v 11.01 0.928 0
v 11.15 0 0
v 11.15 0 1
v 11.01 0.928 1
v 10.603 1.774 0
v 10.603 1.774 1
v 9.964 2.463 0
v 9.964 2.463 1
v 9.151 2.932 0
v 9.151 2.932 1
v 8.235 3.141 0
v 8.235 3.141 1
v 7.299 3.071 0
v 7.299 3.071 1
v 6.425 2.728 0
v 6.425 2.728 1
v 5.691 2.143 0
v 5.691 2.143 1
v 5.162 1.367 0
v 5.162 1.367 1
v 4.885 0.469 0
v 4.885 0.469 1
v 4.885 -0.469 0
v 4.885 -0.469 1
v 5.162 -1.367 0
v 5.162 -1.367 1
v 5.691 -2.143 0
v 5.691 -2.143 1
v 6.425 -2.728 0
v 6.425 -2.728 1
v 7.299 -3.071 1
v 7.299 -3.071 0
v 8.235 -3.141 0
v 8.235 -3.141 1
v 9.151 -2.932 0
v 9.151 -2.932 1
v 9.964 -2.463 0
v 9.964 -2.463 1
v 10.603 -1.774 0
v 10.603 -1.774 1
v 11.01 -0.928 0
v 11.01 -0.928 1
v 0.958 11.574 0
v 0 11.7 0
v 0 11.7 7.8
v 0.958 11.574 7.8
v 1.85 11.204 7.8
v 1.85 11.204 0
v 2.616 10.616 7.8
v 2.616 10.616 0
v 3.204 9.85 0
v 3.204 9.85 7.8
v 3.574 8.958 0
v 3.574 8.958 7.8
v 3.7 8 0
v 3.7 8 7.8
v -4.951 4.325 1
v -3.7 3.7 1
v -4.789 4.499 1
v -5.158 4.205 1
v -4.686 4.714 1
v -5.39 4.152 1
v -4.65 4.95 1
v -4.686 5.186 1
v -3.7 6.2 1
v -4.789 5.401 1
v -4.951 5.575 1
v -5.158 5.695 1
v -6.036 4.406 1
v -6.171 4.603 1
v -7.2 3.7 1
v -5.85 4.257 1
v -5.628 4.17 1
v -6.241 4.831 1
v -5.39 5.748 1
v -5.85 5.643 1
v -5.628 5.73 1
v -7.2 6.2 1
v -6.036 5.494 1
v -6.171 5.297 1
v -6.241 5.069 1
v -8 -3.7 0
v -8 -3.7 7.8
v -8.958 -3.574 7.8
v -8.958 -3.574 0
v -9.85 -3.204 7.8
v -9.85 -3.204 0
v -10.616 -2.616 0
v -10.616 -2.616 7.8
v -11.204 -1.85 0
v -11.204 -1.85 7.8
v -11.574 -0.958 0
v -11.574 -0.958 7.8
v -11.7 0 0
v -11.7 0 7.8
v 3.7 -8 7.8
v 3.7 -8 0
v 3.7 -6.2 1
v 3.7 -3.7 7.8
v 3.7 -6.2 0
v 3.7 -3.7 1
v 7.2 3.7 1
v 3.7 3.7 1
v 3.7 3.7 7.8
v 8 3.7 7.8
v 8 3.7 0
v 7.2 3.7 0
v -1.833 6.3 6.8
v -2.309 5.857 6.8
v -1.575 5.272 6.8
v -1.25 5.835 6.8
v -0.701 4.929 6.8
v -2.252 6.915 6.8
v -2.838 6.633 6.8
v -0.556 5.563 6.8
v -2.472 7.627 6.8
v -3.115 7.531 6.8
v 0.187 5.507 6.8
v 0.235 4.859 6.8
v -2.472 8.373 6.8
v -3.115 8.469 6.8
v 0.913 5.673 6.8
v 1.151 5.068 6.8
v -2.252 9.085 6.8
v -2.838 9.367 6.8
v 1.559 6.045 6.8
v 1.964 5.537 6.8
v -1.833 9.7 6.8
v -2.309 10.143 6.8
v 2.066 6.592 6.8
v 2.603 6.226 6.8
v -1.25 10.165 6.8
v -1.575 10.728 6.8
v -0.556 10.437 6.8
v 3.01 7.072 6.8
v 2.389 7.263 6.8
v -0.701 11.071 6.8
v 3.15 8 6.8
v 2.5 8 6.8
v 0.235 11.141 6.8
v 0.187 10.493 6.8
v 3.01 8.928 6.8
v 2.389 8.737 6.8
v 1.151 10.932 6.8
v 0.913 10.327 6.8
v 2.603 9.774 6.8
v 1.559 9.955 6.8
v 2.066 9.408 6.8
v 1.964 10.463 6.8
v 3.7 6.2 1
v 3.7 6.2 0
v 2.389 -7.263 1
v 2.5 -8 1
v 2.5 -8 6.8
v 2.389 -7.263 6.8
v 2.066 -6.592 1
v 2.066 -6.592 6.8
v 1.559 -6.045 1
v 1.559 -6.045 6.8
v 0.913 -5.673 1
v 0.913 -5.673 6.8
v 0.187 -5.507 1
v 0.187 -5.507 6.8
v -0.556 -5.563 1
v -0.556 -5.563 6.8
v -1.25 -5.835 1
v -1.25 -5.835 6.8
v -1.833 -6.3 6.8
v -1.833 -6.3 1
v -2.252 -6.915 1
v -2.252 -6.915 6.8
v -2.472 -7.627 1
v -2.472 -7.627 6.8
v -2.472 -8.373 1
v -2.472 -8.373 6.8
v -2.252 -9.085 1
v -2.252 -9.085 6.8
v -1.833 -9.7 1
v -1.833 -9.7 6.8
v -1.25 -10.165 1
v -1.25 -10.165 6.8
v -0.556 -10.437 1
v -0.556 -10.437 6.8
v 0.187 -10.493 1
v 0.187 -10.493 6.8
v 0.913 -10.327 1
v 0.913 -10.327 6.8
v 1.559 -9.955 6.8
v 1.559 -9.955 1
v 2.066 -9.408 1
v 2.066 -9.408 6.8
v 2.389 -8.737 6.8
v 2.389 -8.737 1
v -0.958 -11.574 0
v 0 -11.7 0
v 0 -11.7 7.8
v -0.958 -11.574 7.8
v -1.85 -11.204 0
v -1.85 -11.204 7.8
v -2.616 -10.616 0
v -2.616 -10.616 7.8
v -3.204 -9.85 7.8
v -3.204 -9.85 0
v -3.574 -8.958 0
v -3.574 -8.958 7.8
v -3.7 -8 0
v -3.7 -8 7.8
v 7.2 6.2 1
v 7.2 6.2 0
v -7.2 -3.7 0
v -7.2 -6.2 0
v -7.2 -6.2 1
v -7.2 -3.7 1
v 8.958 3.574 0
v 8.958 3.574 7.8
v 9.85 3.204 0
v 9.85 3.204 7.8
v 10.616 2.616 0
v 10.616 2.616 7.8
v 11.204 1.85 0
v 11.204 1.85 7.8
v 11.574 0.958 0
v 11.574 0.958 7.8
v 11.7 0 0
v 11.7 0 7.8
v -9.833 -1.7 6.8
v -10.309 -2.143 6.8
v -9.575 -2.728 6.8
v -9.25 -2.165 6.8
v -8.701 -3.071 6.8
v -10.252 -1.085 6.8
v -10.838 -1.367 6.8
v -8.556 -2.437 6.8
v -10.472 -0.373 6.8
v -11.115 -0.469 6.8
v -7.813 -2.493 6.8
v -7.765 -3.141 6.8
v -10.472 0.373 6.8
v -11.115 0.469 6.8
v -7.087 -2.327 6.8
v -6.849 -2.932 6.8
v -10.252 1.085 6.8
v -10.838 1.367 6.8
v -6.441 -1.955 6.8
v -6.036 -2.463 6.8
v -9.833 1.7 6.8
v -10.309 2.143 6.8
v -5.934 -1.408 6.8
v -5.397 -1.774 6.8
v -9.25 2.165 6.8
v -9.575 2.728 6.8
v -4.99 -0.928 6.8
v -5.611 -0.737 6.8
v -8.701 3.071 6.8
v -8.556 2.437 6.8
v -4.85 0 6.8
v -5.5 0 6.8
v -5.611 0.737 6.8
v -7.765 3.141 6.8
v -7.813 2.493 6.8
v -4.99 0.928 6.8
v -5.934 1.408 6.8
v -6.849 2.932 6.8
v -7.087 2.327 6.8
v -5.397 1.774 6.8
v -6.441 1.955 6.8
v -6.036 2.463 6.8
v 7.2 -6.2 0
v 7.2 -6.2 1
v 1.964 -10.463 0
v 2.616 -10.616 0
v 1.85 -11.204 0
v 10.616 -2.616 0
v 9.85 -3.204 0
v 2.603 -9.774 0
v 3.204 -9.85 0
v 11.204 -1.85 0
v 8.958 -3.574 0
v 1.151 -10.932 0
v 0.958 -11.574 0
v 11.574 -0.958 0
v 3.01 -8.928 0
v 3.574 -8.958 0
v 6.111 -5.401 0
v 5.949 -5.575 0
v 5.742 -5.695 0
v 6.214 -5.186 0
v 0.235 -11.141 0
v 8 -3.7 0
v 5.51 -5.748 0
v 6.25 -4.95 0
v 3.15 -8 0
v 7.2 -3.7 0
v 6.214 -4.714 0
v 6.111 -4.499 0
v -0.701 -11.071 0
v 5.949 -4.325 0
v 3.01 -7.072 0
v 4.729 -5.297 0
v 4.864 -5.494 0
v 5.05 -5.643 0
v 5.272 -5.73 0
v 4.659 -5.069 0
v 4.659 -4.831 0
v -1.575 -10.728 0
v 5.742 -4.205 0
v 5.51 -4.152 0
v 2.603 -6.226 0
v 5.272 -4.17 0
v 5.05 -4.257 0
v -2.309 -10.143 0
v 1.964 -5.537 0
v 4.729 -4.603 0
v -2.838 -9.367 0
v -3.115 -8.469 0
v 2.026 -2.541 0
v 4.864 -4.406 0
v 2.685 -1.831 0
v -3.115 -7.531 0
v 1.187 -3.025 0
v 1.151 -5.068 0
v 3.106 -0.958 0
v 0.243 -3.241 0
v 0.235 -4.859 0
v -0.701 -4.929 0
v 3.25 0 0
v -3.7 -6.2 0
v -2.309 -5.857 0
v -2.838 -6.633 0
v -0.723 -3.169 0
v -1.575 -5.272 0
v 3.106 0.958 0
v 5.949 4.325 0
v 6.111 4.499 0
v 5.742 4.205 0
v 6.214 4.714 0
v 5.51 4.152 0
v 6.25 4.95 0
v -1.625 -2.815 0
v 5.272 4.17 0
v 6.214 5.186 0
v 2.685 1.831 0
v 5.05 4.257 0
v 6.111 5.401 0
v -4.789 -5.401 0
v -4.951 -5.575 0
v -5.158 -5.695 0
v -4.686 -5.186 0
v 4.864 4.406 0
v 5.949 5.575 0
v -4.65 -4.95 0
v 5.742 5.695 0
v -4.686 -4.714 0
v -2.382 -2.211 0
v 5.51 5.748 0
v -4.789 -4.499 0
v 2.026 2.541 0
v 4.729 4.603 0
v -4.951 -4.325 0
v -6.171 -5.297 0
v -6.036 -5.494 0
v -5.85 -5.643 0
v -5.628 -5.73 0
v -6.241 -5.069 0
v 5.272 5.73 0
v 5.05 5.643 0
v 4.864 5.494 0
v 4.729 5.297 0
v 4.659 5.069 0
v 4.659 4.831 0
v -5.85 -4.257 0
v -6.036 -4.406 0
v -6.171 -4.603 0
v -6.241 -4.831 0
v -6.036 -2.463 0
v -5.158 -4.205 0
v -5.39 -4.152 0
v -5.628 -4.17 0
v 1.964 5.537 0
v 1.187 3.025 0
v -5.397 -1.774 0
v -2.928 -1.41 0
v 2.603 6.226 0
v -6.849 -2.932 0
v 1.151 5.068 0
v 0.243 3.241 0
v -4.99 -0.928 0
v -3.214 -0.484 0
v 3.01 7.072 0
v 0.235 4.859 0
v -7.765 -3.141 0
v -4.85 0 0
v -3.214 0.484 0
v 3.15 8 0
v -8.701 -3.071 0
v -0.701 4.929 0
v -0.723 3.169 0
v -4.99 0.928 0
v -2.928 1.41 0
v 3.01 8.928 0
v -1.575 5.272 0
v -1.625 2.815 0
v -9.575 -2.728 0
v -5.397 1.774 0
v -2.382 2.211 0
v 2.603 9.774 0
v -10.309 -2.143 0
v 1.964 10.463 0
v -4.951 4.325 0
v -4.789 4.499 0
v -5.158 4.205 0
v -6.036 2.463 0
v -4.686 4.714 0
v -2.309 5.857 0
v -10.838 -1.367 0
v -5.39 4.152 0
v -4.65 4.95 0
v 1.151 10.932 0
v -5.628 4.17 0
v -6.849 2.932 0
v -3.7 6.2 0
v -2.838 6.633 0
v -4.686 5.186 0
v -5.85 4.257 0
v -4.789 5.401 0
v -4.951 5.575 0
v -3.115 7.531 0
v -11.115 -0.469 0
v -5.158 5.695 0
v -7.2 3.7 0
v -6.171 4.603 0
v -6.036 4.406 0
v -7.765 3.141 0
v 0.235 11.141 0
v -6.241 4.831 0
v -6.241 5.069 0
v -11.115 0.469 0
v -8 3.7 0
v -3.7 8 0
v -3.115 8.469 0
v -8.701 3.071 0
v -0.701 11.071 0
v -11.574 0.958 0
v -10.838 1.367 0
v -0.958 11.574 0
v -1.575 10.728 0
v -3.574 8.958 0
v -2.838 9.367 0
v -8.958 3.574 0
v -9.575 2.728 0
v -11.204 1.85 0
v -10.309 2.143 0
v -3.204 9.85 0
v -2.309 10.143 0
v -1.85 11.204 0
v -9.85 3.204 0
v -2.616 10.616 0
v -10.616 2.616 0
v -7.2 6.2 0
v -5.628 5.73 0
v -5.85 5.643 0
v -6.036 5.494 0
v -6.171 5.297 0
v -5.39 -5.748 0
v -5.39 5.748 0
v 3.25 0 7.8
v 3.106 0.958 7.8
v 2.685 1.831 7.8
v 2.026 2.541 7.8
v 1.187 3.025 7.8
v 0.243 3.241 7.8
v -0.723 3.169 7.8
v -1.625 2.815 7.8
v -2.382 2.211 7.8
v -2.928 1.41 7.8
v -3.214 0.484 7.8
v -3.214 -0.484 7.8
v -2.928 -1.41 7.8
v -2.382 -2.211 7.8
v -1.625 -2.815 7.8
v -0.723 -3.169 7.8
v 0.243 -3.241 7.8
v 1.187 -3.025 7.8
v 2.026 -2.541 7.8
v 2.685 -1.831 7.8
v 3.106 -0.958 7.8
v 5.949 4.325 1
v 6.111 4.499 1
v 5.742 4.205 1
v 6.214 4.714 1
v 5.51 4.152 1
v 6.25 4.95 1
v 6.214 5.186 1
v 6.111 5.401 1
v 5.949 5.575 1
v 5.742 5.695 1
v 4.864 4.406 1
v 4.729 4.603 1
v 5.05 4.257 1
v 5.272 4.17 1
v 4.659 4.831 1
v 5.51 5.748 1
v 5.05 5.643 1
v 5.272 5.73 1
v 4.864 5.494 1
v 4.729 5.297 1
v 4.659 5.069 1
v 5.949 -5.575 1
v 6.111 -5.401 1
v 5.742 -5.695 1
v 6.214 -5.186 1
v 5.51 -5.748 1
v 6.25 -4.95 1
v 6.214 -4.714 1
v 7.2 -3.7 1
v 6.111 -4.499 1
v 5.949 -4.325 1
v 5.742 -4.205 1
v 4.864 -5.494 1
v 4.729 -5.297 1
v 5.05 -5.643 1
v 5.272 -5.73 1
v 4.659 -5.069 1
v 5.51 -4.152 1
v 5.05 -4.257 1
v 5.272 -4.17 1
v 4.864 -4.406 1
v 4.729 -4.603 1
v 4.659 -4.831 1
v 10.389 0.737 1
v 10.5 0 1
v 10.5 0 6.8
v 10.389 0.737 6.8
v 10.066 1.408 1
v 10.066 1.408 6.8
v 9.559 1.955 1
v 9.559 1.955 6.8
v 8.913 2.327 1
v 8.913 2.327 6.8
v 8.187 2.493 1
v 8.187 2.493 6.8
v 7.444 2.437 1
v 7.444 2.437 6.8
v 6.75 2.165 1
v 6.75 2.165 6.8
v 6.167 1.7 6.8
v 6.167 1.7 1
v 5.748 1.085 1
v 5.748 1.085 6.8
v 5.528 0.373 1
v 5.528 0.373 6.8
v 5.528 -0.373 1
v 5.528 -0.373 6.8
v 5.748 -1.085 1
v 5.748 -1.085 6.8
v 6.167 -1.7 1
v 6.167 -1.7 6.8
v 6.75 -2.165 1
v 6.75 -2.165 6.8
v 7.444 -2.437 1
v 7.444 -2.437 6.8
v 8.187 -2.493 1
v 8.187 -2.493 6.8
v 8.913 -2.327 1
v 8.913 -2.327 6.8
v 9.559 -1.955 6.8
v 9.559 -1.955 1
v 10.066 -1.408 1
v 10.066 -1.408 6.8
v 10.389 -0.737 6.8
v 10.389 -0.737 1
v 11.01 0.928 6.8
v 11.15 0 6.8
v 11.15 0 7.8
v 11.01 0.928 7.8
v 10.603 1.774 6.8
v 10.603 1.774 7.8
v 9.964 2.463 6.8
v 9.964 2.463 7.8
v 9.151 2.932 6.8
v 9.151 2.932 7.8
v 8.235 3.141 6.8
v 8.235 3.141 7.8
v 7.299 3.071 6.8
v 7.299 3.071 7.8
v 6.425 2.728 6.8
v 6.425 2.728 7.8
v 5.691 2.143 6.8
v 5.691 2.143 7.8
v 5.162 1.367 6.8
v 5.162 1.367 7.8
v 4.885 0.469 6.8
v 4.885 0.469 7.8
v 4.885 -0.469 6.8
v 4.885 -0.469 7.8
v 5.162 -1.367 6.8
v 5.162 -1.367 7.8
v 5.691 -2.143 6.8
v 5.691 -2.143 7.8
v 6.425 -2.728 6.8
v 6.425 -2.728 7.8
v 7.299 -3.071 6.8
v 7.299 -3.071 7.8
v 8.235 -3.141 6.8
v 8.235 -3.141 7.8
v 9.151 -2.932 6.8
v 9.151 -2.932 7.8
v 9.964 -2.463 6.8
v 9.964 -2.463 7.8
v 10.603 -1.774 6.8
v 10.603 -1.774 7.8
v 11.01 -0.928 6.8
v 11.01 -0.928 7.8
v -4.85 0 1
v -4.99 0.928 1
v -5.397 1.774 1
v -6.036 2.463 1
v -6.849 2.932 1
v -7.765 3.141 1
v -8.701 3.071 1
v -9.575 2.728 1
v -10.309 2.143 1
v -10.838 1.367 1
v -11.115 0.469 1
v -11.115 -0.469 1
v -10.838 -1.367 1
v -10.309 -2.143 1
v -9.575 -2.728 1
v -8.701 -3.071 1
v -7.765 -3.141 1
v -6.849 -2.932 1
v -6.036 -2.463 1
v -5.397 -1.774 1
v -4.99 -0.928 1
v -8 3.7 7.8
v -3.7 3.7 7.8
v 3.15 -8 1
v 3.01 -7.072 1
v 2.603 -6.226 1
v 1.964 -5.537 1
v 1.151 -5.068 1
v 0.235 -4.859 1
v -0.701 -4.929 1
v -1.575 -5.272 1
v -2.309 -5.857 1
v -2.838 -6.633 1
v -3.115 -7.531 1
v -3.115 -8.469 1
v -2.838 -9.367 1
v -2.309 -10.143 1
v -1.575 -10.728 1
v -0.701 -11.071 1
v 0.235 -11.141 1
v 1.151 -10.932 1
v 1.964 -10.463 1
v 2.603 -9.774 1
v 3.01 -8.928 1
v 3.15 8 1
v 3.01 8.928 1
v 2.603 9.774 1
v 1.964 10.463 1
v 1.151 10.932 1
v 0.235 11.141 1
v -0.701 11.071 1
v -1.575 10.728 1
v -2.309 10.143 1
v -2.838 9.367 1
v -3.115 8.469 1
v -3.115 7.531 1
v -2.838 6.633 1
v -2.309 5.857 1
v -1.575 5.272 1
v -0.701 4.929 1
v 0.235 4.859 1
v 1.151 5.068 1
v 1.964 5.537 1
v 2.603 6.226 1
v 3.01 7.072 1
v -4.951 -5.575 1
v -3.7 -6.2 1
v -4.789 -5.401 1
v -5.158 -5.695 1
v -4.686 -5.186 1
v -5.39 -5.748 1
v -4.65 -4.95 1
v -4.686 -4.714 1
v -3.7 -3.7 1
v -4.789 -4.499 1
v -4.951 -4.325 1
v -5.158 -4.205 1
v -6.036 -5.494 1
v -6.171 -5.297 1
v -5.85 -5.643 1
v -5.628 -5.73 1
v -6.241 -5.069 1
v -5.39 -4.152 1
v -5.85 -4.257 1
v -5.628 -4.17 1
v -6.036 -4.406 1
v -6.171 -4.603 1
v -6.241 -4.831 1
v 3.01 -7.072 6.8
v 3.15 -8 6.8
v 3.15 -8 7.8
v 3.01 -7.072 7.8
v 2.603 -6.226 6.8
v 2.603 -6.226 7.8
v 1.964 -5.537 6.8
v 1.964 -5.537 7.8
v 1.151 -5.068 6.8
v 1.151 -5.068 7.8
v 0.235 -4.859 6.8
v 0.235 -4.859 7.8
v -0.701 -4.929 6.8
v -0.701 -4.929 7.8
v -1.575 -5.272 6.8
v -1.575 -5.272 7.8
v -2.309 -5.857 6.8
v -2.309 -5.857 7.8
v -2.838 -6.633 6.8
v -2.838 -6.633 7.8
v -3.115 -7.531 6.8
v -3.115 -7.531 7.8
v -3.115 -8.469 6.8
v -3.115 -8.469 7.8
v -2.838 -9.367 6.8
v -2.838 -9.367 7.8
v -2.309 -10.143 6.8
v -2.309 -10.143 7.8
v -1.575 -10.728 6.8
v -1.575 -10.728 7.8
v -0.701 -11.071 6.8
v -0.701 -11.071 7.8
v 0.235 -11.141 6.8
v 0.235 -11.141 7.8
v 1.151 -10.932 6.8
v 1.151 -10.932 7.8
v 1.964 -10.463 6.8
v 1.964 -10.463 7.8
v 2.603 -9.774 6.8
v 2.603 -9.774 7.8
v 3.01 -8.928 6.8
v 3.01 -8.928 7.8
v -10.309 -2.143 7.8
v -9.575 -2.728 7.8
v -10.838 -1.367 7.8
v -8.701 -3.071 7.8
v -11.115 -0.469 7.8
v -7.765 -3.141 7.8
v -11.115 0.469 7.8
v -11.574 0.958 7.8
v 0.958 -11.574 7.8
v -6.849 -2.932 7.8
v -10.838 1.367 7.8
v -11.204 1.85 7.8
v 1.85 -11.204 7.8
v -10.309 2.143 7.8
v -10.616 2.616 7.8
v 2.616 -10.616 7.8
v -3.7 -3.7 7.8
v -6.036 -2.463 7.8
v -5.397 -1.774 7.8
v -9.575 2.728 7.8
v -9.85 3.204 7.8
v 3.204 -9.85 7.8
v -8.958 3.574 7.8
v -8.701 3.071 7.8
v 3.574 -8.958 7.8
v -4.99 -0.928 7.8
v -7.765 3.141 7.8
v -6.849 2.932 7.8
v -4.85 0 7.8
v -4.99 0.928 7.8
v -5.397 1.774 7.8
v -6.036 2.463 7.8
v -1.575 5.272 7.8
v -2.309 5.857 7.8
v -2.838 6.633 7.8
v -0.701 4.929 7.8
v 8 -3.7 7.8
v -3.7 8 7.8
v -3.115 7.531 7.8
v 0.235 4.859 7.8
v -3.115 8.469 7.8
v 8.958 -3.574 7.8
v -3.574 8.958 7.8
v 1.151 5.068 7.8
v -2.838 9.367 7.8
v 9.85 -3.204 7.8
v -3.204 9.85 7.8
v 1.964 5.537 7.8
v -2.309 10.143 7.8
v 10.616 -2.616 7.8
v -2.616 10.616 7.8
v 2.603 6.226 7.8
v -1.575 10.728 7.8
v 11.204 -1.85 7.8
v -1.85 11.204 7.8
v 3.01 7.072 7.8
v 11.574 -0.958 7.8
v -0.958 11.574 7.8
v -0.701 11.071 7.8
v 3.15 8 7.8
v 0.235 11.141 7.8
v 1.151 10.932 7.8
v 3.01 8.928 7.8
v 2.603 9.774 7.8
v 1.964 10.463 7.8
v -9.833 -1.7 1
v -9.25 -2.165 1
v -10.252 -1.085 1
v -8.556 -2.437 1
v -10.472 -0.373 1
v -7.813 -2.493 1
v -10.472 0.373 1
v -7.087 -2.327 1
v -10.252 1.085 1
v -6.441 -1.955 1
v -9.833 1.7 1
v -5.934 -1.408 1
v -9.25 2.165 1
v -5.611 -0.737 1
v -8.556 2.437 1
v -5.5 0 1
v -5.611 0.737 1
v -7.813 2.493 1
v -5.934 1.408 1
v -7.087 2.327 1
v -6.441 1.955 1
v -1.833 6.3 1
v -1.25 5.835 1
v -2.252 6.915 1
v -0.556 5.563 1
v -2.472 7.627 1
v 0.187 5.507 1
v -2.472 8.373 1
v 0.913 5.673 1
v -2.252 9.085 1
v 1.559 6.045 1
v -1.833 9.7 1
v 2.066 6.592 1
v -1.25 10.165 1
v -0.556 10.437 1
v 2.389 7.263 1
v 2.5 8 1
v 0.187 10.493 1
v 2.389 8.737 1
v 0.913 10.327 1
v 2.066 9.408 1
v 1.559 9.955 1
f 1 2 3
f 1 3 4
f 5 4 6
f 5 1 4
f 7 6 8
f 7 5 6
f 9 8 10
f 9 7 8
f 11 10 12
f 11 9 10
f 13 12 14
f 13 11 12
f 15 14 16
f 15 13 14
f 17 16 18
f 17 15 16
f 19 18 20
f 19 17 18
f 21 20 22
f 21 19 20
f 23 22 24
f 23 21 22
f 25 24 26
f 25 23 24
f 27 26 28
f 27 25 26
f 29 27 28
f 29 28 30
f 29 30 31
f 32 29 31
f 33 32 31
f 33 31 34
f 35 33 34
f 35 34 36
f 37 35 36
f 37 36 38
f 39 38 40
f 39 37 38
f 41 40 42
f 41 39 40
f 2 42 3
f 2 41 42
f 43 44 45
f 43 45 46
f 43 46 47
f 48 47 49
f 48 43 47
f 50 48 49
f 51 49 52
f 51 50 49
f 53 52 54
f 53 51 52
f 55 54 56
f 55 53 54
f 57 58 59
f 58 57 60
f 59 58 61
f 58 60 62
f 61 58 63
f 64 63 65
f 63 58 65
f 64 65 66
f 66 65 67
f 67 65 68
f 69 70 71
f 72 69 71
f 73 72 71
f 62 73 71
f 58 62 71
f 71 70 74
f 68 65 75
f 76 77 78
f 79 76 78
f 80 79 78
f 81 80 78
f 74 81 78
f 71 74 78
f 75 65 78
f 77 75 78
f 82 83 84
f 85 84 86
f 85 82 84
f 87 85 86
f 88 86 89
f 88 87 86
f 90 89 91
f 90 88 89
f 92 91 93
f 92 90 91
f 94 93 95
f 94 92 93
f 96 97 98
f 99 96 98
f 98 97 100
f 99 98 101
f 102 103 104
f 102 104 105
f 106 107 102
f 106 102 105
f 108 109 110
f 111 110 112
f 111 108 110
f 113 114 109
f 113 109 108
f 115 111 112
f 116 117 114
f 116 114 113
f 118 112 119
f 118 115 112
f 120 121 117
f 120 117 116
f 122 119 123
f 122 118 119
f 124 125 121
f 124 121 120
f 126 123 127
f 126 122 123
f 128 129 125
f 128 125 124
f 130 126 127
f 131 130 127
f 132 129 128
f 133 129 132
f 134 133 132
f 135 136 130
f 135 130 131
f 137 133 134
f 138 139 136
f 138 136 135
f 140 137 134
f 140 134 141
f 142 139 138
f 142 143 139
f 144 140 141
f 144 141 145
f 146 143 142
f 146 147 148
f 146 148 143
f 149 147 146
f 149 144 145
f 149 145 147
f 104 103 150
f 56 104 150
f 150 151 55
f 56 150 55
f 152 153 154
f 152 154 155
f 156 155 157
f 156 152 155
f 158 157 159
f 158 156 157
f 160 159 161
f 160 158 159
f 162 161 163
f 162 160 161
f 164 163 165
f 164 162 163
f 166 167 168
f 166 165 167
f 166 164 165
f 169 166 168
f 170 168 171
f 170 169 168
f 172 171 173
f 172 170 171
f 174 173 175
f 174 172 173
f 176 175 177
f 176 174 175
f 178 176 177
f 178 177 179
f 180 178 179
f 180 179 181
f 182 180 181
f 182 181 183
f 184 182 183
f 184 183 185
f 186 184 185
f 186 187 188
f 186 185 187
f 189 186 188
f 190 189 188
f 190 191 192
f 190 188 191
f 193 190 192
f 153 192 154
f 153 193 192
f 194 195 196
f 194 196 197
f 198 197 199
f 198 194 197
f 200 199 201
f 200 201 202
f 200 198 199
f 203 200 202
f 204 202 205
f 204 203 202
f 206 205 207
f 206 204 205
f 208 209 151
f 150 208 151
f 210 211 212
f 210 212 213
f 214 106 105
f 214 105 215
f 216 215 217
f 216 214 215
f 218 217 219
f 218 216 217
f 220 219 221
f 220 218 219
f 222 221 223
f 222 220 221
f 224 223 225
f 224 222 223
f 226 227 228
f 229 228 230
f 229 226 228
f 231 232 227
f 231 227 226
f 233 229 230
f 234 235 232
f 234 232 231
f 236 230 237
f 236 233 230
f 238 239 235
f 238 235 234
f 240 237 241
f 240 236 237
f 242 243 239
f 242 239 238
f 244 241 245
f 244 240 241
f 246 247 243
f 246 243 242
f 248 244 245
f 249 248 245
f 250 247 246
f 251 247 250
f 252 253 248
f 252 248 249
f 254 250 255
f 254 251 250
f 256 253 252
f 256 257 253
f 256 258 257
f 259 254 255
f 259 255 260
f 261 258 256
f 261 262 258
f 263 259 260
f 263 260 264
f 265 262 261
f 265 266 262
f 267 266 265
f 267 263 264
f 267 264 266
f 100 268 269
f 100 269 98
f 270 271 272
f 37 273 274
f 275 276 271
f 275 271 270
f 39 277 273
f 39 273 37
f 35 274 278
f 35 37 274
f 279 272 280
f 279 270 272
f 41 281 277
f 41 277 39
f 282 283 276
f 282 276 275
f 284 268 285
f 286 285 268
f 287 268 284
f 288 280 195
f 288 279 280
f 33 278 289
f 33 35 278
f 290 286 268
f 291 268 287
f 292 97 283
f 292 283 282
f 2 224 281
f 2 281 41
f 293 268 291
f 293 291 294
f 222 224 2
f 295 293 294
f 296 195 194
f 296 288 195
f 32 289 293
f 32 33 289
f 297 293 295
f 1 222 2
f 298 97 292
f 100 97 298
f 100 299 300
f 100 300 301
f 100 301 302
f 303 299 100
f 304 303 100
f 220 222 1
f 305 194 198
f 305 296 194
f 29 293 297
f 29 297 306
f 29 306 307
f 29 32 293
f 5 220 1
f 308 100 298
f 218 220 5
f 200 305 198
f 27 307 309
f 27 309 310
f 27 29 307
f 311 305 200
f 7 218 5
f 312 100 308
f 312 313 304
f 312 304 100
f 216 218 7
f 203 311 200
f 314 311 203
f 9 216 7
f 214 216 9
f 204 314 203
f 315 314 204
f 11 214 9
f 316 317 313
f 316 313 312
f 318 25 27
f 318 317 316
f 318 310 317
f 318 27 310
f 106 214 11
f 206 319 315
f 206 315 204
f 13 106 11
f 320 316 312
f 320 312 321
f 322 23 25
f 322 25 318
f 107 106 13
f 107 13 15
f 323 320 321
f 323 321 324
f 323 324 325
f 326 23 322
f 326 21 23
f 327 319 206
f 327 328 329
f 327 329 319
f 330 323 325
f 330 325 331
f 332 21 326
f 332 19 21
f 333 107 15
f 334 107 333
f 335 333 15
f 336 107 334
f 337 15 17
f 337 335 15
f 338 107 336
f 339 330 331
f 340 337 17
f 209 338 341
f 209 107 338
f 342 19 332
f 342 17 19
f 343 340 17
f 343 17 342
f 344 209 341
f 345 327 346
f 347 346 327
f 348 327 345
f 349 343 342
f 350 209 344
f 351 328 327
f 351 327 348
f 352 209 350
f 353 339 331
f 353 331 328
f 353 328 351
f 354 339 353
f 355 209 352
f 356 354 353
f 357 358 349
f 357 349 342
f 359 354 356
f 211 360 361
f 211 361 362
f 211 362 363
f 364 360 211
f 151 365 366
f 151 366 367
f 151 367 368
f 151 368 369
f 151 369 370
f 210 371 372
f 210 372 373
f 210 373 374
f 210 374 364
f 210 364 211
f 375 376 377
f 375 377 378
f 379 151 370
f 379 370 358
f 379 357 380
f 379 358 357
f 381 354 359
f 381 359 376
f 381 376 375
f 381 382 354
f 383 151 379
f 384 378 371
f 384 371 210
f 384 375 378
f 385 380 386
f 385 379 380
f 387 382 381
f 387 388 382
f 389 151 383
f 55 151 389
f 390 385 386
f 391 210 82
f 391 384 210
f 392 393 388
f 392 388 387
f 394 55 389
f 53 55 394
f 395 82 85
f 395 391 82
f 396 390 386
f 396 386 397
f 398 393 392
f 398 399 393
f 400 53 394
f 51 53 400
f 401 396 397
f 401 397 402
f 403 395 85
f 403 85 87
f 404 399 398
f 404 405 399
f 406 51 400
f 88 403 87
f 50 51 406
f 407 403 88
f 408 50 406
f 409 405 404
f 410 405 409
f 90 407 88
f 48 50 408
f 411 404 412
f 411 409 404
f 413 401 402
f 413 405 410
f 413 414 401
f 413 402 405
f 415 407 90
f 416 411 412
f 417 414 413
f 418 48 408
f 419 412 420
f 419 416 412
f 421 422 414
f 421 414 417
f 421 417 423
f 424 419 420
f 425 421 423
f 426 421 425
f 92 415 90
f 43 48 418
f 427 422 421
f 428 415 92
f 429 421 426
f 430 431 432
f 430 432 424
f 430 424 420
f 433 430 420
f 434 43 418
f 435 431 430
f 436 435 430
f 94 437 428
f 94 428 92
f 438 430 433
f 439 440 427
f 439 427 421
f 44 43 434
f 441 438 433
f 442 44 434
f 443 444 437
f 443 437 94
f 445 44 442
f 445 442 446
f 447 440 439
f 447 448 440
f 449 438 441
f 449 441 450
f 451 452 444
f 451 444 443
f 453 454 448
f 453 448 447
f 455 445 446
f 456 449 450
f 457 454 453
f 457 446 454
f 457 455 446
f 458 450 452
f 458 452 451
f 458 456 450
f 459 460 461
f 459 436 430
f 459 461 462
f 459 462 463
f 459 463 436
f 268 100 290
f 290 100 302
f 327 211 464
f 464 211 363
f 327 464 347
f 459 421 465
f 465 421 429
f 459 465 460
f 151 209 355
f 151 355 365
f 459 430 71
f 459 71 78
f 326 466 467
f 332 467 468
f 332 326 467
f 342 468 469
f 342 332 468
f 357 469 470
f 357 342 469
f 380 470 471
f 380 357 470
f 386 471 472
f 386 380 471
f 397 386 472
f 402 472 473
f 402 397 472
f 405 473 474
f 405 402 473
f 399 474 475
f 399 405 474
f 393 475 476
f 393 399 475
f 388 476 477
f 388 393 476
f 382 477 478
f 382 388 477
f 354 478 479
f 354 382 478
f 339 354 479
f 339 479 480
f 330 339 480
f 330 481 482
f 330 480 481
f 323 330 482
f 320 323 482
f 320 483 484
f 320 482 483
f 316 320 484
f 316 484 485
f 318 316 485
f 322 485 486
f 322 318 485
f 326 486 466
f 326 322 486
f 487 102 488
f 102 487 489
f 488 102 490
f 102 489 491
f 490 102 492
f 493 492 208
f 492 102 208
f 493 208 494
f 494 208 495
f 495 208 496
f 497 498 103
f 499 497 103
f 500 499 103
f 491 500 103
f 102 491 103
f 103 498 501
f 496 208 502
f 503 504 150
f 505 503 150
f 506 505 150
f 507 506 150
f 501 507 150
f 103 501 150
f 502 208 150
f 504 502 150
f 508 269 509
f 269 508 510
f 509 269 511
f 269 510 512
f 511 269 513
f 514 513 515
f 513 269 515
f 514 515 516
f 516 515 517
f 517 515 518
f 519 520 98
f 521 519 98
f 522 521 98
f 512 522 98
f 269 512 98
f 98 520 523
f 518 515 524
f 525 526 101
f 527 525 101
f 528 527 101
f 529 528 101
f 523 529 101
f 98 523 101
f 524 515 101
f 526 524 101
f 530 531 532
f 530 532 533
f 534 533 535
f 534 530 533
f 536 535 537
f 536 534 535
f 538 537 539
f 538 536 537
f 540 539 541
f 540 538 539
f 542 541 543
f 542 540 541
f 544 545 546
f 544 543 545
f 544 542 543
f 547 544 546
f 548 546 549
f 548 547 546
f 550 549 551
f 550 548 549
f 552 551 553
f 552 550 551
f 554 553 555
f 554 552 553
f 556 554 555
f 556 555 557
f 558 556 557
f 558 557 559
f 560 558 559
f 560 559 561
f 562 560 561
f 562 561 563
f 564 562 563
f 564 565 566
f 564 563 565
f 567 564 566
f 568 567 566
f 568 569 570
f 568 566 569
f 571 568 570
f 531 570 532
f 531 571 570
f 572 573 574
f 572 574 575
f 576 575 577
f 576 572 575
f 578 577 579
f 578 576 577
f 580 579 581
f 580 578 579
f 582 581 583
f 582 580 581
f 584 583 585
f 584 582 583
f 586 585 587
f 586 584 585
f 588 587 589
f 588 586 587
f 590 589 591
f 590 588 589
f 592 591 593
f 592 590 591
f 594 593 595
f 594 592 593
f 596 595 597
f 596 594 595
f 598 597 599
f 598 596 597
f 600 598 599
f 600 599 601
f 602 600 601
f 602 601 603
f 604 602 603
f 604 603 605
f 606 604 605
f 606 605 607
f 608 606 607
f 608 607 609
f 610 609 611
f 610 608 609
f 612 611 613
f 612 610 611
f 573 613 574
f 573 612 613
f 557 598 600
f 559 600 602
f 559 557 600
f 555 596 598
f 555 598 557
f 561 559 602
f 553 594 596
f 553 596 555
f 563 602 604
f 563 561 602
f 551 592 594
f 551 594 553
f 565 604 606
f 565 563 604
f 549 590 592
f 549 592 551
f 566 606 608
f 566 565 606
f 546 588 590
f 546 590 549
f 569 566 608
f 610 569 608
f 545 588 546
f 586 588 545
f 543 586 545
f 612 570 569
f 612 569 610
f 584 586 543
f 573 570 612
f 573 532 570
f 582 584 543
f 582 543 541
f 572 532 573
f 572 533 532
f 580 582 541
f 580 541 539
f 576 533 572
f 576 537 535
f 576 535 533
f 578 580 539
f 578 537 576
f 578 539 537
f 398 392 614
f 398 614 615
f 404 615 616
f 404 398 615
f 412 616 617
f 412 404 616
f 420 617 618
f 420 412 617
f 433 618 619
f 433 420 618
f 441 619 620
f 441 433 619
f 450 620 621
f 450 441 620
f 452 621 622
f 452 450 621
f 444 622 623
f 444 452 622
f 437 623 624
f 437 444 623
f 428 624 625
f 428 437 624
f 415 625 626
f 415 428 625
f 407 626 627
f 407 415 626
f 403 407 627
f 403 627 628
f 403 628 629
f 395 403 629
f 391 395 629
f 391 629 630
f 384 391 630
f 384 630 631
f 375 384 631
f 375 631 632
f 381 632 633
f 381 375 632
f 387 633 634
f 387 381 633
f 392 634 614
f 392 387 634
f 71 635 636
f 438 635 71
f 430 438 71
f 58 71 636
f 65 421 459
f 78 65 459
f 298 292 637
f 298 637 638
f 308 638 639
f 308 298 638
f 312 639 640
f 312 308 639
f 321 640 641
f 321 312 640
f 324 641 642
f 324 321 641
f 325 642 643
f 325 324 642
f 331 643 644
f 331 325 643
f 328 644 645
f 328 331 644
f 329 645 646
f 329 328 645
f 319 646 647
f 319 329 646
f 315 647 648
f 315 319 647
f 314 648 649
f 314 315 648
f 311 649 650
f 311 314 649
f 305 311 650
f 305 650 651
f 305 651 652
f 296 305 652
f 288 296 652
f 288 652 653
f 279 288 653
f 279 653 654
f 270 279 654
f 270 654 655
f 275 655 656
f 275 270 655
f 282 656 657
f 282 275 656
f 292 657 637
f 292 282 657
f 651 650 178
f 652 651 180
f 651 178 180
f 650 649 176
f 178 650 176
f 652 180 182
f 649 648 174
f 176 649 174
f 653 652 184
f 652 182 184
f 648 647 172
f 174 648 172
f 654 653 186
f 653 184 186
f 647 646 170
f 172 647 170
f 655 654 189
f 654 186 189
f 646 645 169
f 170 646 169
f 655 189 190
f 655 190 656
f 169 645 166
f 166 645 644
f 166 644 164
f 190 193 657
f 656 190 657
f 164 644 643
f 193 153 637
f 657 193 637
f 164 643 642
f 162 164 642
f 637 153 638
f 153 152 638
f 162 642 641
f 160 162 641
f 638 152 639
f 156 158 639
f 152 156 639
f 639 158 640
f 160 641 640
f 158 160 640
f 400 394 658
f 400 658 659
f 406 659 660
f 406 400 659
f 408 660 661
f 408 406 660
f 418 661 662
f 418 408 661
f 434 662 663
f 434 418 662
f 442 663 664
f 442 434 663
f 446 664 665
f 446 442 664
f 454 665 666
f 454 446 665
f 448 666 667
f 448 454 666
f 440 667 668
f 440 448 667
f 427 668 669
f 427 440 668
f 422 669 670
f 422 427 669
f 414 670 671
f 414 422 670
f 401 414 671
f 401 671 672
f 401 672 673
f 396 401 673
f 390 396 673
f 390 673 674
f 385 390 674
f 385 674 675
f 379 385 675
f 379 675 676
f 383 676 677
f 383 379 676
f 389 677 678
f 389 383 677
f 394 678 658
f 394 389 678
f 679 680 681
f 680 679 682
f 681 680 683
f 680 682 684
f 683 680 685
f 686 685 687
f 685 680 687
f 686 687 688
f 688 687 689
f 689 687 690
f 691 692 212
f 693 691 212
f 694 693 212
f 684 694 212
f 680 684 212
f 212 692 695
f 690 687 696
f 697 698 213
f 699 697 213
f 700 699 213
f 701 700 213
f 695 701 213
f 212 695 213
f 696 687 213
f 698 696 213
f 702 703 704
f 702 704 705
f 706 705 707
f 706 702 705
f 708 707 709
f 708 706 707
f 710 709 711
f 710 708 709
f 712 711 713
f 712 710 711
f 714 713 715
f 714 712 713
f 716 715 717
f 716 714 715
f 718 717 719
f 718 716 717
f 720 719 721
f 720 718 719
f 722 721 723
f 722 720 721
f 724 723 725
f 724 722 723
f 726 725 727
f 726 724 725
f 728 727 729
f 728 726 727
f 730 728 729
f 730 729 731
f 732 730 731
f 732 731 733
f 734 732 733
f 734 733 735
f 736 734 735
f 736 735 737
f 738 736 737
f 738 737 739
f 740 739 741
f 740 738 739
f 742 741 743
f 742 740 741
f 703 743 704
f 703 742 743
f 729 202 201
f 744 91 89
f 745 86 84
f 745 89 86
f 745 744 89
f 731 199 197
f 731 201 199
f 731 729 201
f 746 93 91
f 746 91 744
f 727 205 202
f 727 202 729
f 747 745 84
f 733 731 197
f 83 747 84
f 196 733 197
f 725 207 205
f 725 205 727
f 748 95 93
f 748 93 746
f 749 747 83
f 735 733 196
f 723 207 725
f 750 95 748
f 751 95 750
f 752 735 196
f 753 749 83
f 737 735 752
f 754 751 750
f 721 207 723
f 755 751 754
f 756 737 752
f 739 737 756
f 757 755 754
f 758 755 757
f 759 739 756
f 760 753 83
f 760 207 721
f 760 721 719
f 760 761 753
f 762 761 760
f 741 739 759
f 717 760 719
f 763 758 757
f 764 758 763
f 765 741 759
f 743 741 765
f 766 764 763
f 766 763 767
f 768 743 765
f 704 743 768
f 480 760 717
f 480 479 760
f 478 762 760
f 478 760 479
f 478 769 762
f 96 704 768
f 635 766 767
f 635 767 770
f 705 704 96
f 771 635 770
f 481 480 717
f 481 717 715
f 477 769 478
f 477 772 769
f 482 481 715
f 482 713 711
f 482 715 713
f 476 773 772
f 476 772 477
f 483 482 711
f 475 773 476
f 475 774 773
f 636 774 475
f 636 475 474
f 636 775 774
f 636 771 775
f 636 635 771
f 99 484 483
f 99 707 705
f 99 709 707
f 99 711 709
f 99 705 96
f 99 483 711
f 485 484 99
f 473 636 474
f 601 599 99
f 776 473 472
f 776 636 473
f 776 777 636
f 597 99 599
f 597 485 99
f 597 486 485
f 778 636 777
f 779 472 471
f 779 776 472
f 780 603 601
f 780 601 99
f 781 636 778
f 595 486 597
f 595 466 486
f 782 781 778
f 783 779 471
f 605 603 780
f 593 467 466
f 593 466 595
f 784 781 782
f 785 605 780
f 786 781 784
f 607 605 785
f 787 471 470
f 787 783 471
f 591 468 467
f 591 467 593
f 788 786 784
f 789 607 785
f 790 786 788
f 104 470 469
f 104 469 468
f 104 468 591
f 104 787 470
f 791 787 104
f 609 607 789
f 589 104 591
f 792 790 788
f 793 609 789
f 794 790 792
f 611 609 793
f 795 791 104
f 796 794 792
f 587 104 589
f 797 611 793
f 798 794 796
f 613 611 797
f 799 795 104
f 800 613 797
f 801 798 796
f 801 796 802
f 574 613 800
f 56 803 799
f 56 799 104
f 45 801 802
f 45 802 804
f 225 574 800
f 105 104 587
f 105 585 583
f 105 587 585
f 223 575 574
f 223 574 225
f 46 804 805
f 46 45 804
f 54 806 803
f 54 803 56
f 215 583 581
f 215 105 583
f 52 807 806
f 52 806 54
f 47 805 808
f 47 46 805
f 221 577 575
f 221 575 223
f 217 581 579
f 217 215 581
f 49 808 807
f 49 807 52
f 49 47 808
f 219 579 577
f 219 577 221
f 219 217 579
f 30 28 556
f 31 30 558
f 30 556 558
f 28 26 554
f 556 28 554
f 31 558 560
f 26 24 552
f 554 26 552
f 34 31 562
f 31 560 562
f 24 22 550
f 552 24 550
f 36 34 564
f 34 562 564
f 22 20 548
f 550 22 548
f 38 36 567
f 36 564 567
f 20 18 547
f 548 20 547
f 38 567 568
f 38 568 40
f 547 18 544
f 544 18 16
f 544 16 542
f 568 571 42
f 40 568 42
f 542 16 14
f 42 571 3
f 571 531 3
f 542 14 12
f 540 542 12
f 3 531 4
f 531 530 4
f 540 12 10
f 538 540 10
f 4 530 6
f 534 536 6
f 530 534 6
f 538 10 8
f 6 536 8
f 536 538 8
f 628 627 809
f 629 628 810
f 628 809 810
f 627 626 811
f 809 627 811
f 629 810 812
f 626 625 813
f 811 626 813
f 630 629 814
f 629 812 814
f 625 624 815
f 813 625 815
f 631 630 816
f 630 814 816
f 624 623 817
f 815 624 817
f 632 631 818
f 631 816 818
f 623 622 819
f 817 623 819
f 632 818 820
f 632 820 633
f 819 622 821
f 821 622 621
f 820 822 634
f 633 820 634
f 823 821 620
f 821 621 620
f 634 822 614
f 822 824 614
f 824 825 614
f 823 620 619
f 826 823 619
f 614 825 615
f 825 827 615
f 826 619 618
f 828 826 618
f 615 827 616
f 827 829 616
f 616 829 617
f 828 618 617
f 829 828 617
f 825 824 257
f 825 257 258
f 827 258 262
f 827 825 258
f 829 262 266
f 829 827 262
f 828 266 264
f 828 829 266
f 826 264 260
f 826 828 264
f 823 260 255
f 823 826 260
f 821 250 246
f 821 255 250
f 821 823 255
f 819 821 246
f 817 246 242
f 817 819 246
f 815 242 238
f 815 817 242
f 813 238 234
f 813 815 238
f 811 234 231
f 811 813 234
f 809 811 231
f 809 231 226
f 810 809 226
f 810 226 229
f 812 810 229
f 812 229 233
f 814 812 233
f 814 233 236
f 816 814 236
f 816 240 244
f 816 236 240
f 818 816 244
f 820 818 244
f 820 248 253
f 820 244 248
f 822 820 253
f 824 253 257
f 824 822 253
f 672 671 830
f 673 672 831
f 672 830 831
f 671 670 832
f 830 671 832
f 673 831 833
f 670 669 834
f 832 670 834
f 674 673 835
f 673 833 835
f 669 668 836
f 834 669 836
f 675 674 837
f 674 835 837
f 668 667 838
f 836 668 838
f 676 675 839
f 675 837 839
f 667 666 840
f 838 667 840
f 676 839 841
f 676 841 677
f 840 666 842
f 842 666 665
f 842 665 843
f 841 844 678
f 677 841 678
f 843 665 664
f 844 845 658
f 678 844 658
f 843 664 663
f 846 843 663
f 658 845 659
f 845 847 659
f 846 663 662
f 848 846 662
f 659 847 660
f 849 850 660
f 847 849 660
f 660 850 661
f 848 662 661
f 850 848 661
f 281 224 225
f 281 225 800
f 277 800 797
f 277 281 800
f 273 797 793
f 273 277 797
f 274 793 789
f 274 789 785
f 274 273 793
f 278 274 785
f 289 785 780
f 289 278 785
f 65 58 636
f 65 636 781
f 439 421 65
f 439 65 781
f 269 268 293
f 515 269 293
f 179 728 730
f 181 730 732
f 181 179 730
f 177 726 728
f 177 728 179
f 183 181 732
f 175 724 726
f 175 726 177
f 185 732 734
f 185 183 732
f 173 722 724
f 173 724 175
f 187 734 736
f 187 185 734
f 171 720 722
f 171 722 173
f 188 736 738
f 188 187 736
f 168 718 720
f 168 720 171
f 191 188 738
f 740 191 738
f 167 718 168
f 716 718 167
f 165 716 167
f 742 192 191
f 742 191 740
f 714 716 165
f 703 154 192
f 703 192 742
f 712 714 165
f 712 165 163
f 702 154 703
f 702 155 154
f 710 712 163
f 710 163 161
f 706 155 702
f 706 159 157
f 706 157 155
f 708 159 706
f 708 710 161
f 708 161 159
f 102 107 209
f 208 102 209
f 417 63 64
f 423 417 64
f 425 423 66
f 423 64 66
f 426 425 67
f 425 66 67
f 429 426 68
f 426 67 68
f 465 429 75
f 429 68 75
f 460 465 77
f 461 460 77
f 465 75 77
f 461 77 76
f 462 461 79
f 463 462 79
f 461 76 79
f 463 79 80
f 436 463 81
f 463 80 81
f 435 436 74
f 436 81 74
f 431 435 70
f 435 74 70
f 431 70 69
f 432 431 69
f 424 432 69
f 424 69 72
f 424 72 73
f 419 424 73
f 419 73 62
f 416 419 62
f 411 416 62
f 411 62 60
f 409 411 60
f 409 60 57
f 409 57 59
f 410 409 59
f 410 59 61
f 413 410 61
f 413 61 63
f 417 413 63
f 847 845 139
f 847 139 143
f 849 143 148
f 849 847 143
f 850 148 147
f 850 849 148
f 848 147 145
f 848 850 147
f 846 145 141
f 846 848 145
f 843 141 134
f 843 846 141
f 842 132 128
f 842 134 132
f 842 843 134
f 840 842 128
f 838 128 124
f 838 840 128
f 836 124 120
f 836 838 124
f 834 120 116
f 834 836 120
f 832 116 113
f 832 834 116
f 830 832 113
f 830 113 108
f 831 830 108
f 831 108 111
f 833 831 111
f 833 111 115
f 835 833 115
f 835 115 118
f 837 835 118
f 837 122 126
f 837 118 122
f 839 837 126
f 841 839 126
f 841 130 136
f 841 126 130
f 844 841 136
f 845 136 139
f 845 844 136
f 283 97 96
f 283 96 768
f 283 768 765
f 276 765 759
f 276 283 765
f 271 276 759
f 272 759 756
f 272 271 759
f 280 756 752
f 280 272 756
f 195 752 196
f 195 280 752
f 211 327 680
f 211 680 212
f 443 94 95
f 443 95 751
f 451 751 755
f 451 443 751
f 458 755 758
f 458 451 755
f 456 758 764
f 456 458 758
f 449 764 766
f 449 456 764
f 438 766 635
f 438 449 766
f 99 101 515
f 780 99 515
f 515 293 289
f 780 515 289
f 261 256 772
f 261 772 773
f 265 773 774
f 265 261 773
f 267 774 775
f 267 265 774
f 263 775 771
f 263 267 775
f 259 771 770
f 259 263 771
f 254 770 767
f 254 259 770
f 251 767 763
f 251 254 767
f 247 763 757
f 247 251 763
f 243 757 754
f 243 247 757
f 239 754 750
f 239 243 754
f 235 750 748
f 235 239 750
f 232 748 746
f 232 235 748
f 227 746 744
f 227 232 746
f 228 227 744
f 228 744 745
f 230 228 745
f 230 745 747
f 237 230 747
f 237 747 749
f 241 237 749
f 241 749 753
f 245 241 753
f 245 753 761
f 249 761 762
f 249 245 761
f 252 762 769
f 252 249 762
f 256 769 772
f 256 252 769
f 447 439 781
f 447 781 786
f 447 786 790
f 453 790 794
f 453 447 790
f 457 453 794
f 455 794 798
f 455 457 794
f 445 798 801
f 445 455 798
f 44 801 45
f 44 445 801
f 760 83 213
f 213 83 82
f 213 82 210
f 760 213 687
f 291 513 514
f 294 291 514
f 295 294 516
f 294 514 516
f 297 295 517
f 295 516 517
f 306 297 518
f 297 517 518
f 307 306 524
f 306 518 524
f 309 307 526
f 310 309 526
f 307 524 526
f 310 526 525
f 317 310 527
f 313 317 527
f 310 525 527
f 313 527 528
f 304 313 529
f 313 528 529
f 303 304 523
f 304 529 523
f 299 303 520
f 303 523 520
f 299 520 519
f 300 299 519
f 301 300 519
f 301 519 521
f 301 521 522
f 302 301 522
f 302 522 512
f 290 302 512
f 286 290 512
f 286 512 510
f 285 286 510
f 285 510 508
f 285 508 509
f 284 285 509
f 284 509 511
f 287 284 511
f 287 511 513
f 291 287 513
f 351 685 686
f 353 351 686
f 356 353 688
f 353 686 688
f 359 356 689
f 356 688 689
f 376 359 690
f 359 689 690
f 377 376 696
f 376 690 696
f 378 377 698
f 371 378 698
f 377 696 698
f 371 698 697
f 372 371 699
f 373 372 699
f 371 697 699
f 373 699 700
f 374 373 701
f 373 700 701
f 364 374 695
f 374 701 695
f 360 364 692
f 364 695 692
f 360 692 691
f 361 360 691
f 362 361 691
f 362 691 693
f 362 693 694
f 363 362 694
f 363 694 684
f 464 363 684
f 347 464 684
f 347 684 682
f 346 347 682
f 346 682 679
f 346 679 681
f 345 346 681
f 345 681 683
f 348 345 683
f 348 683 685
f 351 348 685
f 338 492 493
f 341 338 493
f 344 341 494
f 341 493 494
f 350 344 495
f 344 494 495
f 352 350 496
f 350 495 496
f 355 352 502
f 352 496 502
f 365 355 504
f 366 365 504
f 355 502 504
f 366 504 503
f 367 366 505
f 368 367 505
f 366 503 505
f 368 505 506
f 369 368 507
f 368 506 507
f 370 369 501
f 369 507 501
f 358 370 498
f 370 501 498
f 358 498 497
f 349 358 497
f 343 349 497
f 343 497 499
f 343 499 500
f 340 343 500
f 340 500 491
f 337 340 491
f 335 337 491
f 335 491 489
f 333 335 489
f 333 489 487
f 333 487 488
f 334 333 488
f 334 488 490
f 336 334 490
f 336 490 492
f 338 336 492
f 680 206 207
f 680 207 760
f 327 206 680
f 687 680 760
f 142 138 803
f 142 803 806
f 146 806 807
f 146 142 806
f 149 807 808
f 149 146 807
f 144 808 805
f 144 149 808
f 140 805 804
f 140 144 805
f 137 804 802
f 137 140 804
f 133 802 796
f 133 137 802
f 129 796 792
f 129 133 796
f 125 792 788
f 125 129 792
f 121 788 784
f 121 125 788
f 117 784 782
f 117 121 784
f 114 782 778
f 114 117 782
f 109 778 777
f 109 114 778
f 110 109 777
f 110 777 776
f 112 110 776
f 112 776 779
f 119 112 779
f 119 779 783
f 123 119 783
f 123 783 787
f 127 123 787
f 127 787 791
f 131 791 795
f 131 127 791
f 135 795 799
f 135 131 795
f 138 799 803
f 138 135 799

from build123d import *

# Parameters (mm, degrees)
SKETCH_2_W          = 23.4
SKETCH_2_H          = 7.4
SKETCH_2_W_2        = 7.4
SKETCH_2_H_2        = 23.4
EXTRUDE_1_DEPTH     = 7.8
SKETCH_3_W          = 14.4
SKETCH_3_H          = 12.4
EXTRUDE_2_DEPTH     = 1
SKETCH_2_6_R        = 2.5
SKETCH_2_6_R_2      = 3.25
CUT_EXTRUDE_3_DEPTH = 19.292621463
SKETCH_2_3_R        = 3.15
CUT_EXTRUDE_1_DEPTH = 1
CUT_EXTRUDE_START   = 6.8
SKETCH_2_5_R        = 3.15
CUT_EXTRUDE_2_DEPTH = 1
SKETCH_4_R          = 0.8
CUT_EXTRUDE_4_DEPTH = 18.889102828


with BuildPart() as part:
    # 草图2 → 凸台-拉伸1 (new body)
    with BuildSketch(Plane.XY):
        Rectangle(SKETCH_2_W, SKETCH_2_H)
        Rectangle(SKETCH_2_W_2, SKETCH_2_H_2)
    extrude(amount=EXTRUDE_1_DEPTH)

    # 草图3 → 凸台-拉伸2 (add)
    with BuildSketch(Plane(origin=(0, 0, 0), x_dir=(-1, 0, 0), z_dir=(0, 0, -1))):
        Rectangle(SKETCH_3_W, SKETCH_3_H)
    extrude(amount=-EXTRUDE_2_DEPTH)

    # 草图2<6> → 切除-拉伸3 (cut, through all)
    with BuildSketch(Plane.XY):
        with BuildLine():
            Line((-3.7, 11.7), (-3.7, 8))
            ThreePointArc((-3.7, 8), (-2.61629509, 10.61629509), (0, 11.7))
            Line((0, 11.7), (-3.7, 11.7))
        make_face()
        with BuildLine():
            ThreePointArc((0, 11.7), (2.61629509, 10.61629509), (3.7, 8))
            Line((3.7, 8), (3.7, 11.7))
            Line((3.7, 11.7), (0, 11.7))
        make_face()
        with BuildLine():
            Line((11.7, 3.7), (8.000000006, 3.7))
            ThreePointArc((8.000000006, 3.7), (10.616295093, 2.616295088), (11.7, 0))
            Line((11.7, 0), (11.7, 3.7))
        make_face()
        with BuildLine():
            ThreePointArc((11.7, 0), (10.616295085, -2.616295096), (7.999999984, -3.7))
            Line((7.999999984, -3.7), (11.7, -3.7))
            Line((11.7, -3.7), (11.7, 0))
        make_face()
        with BuildLine():
            Line((3.7, -11.7), (3.7, -8))
            ThreePointArc((3.7, -8), (2.61629509, -10.61629509), (0, -11.7))
            Line((0, -11.7), (3.7, -11.7))
        make_face()
        with BuildLine():
            ThreePointArc((0, -11.7), (-2.616295094, -10.616295087), (-3.7, -7.99999999))
            Line((-3.7, -7.99999999), (-3.7, -11.7))
            Line((-3.7, -11.7), (0, -11.7))
        make_face()
        with BuildLine():
            Line((-11.7, -1.1e-08), (-11.7, -3.7))
            Line((-11.7, -3.7), (-8.000000004, -3.7))
            ThreePointArc((-8.000000004, -3.7), (-10.616295088, -2.616295093), (-11.7, -1.1e-08))
        make_face()
        with BuildLine():
            Line((-11.7, 3.7), (-11.7, -1.1e-08))
            ThreePointArc((-11.7, -1.1e-08), (-10.616295094, 2.616295086), (-8, 3.7))
            Line((-8, 3.7), (-11.7, 3.7))
        make_face()
        with Locations((0, 8)):
            Circle(SKETCH_2_6_R)
        with Locations((-8, 0)):
            Circle(SKETCH_2_6_R)
        Circle(SKETCH_2_6_R_2)
        with Locations((8, 0)):
            Circle(SKETCH_2_6_R)
        with Locations((0, -8)):
            Circle(SKETCH_2_6_R)
    extrude(amount=CUT_EXTRUDE_3_DEPTH, mode=Mode.SUBTRACT)

    # 草图2<3> → 切除-拉伸1 (cut)
    with BuildSketch(Plane.XY):
        with Locations((8, 0)):
            Circle(SKETCH_2_3_R)
        with Locations((-8, 0)):
            Circle(SKETCH_2_3_R)
        with Locations((0, 8)):
            Circle(SKETCH_2_3_R)
        with Locations((0, -8)):
            Circle(SKETCH_2_3_R)
    extrude(amount=CUT_EXTRUDE_1_DEPTH, mode=Mode.SUBTRACT)

    # 草图2<5> → 切除-拉伸2 (cut)
    with BuildSketch(Plane.XY.offset(CUT_EXTRUDE_START)):
        with Locations((8, 0)):
            Circle(SKETCH_2_5_R)
        with Locations((-8, 0)):
            Circle(SKETCH_2_5_R)
        with Locations((0, 8)):
            Circle(SKETCH_2_5_R)
        with Locations((0, -8)):
            Circle(SKETCH_2_5_R)
    extrude(amount=CUT_EXTRUDE_2_DEPTH, mode=Mode.SUBTRACT)

    # 草图4 → 切除-拉伸4 (cut, through all)
    with BuildSketch(Plane.XY.offset(1)):
        with Locations((-5.45, 4.95)):
            Circle(SKETCH_4_R)
        with Locations((5.45, 4.95)):
            Circle(SKETCH_4_R)
        with Locations((-5.45, -4.95)):
            Circle(SKETCH_4_R)
        with Locations((5.45, -4.95)):
            Circle(SKETCH_4_R)
    extrude(amount=-CUT_EXTRUDE_4_DEPTH, mode=Mode.SUBTRACT)


solid = part.part
